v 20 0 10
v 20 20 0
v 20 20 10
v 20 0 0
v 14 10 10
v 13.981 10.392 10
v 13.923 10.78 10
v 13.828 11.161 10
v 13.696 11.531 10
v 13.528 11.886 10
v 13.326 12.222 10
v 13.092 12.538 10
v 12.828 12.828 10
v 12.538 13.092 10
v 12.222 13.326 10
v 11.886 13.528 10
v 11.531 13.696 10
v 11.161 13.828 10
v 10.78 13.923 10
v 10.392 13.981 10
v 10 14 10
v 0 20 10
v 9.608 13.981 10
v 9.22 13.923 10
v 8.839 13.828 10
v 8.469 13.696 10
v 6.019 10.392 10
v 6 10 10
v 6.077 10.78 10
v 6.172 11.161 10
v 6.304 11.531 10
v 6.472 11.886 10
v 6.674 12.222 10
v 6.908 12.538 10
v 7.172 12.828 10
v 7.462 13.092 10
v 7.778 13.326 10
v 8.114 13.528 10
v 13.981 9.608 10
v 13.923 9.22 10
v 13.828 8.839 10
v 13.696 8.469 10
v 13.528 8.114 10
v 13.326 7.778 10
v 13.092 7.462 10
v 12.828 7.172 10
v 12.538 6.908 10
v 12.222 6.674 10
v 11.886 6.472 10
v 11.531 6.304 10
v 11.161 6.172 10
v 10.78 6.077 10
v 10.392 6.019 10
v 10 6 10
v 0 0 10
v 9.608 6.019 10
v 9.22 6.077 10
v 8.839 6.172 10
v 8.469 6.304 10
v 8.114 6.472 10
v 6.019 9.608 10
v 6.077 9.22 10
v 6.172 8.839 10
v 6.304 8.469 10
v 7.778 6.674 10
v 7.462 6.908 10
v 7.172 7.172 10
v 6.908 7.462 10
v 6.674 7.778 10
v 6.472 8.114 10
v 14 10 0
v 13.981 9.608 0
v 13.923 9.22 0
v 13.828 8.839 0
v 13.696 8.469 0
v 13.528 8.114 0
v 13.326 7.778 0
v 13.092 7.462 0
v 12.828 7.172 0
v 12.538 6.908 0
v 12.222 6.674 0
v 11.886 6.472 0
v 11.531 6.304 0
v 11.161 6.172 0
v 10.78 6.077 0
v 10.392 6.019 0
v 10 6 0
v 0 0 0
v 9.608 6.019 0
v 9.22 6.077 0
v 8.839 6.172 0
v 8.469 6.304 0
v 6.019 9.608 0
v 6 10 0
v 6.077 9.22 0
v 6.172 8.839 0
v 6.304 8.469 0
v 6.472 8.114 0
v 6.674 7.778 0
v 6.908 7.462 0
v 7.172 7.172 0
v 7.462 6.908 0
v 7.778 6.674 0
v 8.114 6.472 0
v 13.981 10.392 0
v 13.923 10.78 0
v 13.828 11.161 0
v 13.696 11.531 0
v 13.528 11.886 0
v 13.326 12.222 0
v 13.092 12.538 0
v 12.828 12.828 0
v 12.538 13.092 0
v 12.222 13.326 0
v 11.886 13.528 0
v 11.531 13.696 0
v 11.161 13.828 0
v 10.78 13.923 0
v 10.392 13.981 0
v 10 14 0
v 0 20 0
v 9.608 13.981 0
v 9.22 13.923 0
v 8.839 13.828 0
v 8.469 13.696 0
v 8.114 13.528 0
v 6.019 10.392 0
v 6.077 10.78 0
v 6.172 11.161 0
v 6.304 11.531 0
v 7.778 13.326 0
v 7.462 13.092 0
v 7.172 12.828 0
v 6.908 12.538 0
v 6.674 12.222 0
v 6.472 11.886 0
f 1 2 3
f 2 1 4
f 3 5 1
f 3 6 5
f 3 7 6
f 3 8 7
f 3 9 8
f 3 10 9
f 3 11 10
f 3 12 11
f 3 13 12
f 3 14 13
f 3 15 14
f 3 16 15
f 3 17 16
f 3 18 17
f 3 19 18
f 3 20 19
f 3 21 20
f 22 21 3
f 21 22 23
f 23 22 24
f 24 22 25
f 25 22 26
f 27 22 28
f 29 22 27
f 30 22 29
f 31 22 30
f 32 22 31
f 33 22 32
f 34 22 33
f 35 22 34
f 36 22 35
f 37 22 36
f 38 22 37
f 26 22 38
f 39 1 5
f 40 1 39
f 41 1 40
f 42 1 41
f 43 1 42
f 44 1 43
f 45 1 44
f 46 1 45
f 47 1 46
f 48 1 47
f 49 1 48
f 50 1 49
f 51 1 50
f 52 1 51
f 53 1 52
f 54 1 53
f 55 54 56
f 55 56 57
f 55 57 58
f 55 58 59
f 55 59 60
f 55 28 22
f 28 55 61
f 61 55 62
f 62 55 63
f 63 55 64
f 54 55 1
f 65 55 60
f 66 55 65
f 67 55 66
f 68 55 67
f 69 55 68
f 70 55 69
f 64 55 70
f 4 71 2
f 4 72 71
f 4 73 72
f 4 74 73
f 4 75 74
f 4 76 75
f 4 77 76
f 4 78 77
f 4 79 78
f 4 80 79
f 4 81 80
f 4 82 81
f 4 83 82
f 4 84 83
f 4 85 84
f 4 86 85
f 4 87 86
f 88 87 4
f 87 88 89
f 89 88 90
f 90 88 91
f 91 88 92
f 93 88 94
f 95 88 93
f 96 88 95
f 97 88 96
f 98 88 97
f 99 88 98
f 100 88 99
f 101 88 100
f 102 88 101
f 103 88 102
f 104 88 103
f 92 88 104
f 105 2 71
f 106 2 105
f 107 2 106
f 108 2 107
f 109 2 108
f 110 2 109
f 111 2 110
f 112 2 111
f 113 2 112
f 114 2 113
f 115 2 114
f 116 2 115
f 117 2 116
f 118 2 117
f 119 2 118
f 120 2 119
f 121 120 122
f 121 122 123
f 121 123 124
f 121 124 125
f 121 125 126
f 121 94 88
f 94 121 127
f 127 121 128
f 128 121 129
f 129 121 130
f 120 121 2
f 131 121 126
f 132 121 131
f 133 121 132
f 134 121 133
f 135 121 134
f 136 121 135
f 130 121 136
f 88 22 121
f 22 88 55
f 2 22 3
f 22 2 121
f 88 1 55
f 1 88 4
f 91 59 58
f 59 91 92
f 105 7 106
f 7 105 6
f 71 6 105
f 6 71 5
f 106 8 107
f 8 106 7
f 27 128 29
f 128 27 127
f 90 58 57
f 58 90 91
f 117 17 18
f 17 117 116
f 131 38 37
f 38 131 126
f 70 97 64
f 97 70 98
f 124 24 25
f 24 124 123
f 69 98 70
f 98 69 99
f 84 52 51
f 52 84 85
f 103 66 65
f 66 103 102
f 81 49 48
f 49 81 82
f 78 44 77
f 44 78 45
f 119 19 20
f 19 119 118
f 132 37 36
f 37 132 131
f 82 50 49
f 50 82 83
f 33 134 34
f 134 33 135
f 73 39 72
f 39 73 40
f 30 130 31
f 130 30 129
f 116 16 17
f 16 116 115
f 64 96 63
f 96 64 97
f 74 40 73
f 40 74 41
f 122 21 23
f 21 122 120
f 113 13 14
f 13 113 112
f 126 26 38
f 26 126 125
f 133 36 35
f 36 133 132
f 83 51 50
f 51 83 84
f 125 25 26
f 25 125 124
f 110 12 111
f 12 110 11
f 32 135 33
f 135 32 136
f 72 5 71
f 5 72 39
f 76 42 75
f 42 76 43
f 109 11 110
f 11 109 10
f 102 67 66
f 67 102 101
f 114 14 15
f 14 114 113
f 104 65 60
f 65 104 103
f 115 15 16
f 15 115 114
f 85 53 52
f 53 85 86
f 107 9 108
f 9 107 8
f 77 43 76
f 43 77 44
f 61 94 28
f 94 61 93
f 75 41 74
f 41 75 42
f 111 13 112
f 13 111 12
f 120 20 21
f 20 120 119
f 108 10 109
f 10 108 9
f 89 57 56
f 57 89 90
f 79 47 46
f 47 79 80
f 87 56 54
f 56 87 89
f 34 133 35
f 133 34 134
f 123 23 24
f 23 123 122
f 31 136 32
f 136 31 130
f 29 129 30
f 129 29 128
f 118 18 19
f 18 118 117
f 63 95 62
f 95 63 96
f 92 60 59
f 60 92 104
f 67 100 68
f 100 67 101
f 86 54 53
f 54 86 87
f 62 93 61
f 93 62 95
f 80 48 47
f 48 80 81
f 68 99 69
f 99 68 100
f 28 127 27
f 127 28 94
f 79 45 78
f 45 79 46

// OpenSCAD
// A plate with a hole (P5-04, ADR-0071): the OpenSCAD import's fixture.
// The kernel's tests and the CLI's override these variables.

/* [Plate] */
// The plate's side
size = 20; // [10:100]
// Its thickness
height = 10; // [2:1:40]
// The hole's diameter
hole = 8; // [2:0.5:20]

difference() {
  cube([size, size, height]);
  translate([size / 2, size / 2, -1]) cylinder(d = hole, h = height + 2, $fn = 64);
}
